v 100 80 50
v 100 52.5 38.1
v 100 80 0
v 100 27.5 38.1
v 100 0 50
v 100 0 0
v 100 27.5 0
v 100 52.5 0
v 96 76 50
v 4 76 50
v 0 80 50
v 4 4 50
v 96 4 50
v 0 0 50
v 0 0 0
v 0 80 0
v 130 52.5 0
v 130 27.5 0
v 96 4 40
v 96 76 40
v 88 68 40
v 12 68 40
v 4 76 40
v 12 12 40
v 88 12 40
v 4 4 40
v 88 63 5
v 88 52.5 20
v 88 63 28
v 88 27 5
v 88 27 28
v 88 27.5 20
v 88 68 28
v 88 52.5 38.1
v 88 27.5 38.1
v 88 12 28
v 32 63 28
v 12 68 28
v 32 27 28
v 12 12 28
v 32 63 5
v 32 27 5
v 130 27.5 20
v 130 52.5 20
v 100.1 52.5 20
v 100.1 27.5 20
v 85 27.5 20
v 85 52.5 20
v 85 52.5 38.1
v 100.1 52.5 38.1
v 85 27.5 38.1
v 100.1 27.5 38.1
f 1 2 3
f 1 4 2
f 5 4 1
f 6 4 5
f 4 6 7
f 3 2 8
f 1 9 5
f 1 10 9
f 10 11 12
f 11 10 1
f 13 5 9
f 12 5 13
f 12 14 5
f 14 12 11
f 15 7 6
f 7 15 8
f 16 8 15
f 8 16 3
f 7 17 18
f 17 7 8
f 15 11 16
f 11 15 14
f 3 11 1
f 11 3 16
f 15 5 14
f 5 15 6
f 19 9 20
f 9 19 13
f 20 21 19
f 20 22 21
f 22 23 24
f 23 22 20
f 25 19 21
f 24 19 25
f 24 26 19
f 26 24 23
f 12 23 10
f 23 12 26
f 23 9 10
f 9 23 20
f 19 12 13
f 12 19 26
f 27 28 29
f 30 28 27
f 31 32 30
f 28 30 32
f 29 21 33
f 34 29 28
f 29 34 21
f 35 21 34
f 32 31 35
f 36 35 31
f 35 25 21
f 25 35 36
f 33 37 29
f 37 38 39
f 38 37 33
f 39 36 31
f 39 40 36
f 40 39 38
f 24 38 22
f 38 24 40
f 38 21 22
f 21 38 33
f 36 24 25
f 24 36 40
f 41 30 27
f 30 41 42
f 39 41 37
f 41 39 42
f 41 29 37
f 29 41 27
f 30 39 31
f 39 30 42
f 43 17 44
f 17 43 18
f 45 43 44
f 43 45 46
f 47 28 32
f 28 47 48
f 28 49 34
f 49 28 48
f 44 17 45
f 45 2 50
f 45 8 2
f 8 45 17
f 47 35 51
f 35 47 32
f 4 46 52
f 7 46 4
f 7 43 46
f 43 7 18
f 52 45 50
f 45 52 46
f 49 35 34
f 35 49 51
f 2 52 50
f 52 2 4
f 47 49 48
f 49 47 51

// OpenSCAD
// ==============================================
// Parameters (all dimensions in millimeters)
// ==============================================
main_length = 100;    // X-axis size of main body
main_width = 80;      // Y-axis size of main body
main_height = 50;     // Total Z height of main body
bottom_thickness = 5; // Solid thickness at base of cavity
rim_thickness = 4;    // Thickness of top outer rim
upper_recess_depth = 10; // Depth of first top recess below rim
middle_recess_inset = 8; // Inset of middle recess from upper recess walls
middle_recess_depth = 12; // Additional depth of middle recess
deep_pocket_x_offset = 10; // X-axis shift of deepest pocket
deep_pocket_y_offset = 5;  // Y-axis shift of deepest pocket
deep_pocket_inset = 10;    // Inset of deepest pocket from middle recess
side_protrusion_length = 30; // Length of side projection
side_protrusion_width = 25;  // Width of side projection
side_protrusion_height = 20; // Height of side projection
side_recess_depth = 15; // Depth of recess above side projection
side_recess_height = 18;// Height of side recess
$fn = 64; // Smooth resolution for curved features if added

// ==============================================
// Main Model Assembly
// ==============================================
union() {
    // Main body with internal stepped cavities
    difference() {
        // Base main solid
        cube([main_length, main_width, main_height]);

        // Cut upper recess (inside top rim)
        translate([rim_thickness, rim_thickness, main_height - upper_recess_depth])
        cube([
            main_length - 2*rim_thickness,
            main_width - 2*rim_thickness,
            upper_recess_depth + 0.1 // Extra height to avoid z-fighting
        ]);

        // Cut middle recess step
        translate([
            rim_thickness + middle_recess_inset,
            rim_thickness + middle_recess_inset,
            main_height - upper_recess_depth - middle_recess_depth
        ])
        cube([
            main_length - 2*rim_thickness - 2*middle_recess_inset,
            main_width - 2*rim_thickness - 2*middle_recess_inset,
            middle_recess_depth + 0.1
        ]);

        // Cut shifted deepest pocket
        translate([
            rim_thickness + middle_recess_inset + deep_pocket_inset + deep_pocket_x_offset,
            rim_thickness + middle_recess_inset + deep_pocket_inset + deep_pocket_y_offset,
            bottom_thickness
        ])
        cube([
            main_length - 2*rim_thickness - 2*middle_recess_inset - 2*deep_pocket_inset,
            main_width - 2*rim_thickness - 2*middle_recess_inset - 2*deep_pocket_inset,
            main_height - bottom_thickness - upper_recess_depth - middle_recess_depth + 0.1
        ]);
    }

    // Add side projection
    translate([
        main_length,
        (main_width - side_protrusion_width)/2,
        0
    ])
    cube([side_protrusion_length, side_protrusion_width, side_protrusion_height]);
}

// Cut side recess above side projection
difference() {
    children(); // Take the full union above
    translate([
        main_length - side_recess_depth,
        (main_width - side_protrusion_width)/2,
        side_protrusion_height
    ])
    cube([side_recess_depth + 0.1, side_protrusion_width, side_recess_height + 0.1]);
}
